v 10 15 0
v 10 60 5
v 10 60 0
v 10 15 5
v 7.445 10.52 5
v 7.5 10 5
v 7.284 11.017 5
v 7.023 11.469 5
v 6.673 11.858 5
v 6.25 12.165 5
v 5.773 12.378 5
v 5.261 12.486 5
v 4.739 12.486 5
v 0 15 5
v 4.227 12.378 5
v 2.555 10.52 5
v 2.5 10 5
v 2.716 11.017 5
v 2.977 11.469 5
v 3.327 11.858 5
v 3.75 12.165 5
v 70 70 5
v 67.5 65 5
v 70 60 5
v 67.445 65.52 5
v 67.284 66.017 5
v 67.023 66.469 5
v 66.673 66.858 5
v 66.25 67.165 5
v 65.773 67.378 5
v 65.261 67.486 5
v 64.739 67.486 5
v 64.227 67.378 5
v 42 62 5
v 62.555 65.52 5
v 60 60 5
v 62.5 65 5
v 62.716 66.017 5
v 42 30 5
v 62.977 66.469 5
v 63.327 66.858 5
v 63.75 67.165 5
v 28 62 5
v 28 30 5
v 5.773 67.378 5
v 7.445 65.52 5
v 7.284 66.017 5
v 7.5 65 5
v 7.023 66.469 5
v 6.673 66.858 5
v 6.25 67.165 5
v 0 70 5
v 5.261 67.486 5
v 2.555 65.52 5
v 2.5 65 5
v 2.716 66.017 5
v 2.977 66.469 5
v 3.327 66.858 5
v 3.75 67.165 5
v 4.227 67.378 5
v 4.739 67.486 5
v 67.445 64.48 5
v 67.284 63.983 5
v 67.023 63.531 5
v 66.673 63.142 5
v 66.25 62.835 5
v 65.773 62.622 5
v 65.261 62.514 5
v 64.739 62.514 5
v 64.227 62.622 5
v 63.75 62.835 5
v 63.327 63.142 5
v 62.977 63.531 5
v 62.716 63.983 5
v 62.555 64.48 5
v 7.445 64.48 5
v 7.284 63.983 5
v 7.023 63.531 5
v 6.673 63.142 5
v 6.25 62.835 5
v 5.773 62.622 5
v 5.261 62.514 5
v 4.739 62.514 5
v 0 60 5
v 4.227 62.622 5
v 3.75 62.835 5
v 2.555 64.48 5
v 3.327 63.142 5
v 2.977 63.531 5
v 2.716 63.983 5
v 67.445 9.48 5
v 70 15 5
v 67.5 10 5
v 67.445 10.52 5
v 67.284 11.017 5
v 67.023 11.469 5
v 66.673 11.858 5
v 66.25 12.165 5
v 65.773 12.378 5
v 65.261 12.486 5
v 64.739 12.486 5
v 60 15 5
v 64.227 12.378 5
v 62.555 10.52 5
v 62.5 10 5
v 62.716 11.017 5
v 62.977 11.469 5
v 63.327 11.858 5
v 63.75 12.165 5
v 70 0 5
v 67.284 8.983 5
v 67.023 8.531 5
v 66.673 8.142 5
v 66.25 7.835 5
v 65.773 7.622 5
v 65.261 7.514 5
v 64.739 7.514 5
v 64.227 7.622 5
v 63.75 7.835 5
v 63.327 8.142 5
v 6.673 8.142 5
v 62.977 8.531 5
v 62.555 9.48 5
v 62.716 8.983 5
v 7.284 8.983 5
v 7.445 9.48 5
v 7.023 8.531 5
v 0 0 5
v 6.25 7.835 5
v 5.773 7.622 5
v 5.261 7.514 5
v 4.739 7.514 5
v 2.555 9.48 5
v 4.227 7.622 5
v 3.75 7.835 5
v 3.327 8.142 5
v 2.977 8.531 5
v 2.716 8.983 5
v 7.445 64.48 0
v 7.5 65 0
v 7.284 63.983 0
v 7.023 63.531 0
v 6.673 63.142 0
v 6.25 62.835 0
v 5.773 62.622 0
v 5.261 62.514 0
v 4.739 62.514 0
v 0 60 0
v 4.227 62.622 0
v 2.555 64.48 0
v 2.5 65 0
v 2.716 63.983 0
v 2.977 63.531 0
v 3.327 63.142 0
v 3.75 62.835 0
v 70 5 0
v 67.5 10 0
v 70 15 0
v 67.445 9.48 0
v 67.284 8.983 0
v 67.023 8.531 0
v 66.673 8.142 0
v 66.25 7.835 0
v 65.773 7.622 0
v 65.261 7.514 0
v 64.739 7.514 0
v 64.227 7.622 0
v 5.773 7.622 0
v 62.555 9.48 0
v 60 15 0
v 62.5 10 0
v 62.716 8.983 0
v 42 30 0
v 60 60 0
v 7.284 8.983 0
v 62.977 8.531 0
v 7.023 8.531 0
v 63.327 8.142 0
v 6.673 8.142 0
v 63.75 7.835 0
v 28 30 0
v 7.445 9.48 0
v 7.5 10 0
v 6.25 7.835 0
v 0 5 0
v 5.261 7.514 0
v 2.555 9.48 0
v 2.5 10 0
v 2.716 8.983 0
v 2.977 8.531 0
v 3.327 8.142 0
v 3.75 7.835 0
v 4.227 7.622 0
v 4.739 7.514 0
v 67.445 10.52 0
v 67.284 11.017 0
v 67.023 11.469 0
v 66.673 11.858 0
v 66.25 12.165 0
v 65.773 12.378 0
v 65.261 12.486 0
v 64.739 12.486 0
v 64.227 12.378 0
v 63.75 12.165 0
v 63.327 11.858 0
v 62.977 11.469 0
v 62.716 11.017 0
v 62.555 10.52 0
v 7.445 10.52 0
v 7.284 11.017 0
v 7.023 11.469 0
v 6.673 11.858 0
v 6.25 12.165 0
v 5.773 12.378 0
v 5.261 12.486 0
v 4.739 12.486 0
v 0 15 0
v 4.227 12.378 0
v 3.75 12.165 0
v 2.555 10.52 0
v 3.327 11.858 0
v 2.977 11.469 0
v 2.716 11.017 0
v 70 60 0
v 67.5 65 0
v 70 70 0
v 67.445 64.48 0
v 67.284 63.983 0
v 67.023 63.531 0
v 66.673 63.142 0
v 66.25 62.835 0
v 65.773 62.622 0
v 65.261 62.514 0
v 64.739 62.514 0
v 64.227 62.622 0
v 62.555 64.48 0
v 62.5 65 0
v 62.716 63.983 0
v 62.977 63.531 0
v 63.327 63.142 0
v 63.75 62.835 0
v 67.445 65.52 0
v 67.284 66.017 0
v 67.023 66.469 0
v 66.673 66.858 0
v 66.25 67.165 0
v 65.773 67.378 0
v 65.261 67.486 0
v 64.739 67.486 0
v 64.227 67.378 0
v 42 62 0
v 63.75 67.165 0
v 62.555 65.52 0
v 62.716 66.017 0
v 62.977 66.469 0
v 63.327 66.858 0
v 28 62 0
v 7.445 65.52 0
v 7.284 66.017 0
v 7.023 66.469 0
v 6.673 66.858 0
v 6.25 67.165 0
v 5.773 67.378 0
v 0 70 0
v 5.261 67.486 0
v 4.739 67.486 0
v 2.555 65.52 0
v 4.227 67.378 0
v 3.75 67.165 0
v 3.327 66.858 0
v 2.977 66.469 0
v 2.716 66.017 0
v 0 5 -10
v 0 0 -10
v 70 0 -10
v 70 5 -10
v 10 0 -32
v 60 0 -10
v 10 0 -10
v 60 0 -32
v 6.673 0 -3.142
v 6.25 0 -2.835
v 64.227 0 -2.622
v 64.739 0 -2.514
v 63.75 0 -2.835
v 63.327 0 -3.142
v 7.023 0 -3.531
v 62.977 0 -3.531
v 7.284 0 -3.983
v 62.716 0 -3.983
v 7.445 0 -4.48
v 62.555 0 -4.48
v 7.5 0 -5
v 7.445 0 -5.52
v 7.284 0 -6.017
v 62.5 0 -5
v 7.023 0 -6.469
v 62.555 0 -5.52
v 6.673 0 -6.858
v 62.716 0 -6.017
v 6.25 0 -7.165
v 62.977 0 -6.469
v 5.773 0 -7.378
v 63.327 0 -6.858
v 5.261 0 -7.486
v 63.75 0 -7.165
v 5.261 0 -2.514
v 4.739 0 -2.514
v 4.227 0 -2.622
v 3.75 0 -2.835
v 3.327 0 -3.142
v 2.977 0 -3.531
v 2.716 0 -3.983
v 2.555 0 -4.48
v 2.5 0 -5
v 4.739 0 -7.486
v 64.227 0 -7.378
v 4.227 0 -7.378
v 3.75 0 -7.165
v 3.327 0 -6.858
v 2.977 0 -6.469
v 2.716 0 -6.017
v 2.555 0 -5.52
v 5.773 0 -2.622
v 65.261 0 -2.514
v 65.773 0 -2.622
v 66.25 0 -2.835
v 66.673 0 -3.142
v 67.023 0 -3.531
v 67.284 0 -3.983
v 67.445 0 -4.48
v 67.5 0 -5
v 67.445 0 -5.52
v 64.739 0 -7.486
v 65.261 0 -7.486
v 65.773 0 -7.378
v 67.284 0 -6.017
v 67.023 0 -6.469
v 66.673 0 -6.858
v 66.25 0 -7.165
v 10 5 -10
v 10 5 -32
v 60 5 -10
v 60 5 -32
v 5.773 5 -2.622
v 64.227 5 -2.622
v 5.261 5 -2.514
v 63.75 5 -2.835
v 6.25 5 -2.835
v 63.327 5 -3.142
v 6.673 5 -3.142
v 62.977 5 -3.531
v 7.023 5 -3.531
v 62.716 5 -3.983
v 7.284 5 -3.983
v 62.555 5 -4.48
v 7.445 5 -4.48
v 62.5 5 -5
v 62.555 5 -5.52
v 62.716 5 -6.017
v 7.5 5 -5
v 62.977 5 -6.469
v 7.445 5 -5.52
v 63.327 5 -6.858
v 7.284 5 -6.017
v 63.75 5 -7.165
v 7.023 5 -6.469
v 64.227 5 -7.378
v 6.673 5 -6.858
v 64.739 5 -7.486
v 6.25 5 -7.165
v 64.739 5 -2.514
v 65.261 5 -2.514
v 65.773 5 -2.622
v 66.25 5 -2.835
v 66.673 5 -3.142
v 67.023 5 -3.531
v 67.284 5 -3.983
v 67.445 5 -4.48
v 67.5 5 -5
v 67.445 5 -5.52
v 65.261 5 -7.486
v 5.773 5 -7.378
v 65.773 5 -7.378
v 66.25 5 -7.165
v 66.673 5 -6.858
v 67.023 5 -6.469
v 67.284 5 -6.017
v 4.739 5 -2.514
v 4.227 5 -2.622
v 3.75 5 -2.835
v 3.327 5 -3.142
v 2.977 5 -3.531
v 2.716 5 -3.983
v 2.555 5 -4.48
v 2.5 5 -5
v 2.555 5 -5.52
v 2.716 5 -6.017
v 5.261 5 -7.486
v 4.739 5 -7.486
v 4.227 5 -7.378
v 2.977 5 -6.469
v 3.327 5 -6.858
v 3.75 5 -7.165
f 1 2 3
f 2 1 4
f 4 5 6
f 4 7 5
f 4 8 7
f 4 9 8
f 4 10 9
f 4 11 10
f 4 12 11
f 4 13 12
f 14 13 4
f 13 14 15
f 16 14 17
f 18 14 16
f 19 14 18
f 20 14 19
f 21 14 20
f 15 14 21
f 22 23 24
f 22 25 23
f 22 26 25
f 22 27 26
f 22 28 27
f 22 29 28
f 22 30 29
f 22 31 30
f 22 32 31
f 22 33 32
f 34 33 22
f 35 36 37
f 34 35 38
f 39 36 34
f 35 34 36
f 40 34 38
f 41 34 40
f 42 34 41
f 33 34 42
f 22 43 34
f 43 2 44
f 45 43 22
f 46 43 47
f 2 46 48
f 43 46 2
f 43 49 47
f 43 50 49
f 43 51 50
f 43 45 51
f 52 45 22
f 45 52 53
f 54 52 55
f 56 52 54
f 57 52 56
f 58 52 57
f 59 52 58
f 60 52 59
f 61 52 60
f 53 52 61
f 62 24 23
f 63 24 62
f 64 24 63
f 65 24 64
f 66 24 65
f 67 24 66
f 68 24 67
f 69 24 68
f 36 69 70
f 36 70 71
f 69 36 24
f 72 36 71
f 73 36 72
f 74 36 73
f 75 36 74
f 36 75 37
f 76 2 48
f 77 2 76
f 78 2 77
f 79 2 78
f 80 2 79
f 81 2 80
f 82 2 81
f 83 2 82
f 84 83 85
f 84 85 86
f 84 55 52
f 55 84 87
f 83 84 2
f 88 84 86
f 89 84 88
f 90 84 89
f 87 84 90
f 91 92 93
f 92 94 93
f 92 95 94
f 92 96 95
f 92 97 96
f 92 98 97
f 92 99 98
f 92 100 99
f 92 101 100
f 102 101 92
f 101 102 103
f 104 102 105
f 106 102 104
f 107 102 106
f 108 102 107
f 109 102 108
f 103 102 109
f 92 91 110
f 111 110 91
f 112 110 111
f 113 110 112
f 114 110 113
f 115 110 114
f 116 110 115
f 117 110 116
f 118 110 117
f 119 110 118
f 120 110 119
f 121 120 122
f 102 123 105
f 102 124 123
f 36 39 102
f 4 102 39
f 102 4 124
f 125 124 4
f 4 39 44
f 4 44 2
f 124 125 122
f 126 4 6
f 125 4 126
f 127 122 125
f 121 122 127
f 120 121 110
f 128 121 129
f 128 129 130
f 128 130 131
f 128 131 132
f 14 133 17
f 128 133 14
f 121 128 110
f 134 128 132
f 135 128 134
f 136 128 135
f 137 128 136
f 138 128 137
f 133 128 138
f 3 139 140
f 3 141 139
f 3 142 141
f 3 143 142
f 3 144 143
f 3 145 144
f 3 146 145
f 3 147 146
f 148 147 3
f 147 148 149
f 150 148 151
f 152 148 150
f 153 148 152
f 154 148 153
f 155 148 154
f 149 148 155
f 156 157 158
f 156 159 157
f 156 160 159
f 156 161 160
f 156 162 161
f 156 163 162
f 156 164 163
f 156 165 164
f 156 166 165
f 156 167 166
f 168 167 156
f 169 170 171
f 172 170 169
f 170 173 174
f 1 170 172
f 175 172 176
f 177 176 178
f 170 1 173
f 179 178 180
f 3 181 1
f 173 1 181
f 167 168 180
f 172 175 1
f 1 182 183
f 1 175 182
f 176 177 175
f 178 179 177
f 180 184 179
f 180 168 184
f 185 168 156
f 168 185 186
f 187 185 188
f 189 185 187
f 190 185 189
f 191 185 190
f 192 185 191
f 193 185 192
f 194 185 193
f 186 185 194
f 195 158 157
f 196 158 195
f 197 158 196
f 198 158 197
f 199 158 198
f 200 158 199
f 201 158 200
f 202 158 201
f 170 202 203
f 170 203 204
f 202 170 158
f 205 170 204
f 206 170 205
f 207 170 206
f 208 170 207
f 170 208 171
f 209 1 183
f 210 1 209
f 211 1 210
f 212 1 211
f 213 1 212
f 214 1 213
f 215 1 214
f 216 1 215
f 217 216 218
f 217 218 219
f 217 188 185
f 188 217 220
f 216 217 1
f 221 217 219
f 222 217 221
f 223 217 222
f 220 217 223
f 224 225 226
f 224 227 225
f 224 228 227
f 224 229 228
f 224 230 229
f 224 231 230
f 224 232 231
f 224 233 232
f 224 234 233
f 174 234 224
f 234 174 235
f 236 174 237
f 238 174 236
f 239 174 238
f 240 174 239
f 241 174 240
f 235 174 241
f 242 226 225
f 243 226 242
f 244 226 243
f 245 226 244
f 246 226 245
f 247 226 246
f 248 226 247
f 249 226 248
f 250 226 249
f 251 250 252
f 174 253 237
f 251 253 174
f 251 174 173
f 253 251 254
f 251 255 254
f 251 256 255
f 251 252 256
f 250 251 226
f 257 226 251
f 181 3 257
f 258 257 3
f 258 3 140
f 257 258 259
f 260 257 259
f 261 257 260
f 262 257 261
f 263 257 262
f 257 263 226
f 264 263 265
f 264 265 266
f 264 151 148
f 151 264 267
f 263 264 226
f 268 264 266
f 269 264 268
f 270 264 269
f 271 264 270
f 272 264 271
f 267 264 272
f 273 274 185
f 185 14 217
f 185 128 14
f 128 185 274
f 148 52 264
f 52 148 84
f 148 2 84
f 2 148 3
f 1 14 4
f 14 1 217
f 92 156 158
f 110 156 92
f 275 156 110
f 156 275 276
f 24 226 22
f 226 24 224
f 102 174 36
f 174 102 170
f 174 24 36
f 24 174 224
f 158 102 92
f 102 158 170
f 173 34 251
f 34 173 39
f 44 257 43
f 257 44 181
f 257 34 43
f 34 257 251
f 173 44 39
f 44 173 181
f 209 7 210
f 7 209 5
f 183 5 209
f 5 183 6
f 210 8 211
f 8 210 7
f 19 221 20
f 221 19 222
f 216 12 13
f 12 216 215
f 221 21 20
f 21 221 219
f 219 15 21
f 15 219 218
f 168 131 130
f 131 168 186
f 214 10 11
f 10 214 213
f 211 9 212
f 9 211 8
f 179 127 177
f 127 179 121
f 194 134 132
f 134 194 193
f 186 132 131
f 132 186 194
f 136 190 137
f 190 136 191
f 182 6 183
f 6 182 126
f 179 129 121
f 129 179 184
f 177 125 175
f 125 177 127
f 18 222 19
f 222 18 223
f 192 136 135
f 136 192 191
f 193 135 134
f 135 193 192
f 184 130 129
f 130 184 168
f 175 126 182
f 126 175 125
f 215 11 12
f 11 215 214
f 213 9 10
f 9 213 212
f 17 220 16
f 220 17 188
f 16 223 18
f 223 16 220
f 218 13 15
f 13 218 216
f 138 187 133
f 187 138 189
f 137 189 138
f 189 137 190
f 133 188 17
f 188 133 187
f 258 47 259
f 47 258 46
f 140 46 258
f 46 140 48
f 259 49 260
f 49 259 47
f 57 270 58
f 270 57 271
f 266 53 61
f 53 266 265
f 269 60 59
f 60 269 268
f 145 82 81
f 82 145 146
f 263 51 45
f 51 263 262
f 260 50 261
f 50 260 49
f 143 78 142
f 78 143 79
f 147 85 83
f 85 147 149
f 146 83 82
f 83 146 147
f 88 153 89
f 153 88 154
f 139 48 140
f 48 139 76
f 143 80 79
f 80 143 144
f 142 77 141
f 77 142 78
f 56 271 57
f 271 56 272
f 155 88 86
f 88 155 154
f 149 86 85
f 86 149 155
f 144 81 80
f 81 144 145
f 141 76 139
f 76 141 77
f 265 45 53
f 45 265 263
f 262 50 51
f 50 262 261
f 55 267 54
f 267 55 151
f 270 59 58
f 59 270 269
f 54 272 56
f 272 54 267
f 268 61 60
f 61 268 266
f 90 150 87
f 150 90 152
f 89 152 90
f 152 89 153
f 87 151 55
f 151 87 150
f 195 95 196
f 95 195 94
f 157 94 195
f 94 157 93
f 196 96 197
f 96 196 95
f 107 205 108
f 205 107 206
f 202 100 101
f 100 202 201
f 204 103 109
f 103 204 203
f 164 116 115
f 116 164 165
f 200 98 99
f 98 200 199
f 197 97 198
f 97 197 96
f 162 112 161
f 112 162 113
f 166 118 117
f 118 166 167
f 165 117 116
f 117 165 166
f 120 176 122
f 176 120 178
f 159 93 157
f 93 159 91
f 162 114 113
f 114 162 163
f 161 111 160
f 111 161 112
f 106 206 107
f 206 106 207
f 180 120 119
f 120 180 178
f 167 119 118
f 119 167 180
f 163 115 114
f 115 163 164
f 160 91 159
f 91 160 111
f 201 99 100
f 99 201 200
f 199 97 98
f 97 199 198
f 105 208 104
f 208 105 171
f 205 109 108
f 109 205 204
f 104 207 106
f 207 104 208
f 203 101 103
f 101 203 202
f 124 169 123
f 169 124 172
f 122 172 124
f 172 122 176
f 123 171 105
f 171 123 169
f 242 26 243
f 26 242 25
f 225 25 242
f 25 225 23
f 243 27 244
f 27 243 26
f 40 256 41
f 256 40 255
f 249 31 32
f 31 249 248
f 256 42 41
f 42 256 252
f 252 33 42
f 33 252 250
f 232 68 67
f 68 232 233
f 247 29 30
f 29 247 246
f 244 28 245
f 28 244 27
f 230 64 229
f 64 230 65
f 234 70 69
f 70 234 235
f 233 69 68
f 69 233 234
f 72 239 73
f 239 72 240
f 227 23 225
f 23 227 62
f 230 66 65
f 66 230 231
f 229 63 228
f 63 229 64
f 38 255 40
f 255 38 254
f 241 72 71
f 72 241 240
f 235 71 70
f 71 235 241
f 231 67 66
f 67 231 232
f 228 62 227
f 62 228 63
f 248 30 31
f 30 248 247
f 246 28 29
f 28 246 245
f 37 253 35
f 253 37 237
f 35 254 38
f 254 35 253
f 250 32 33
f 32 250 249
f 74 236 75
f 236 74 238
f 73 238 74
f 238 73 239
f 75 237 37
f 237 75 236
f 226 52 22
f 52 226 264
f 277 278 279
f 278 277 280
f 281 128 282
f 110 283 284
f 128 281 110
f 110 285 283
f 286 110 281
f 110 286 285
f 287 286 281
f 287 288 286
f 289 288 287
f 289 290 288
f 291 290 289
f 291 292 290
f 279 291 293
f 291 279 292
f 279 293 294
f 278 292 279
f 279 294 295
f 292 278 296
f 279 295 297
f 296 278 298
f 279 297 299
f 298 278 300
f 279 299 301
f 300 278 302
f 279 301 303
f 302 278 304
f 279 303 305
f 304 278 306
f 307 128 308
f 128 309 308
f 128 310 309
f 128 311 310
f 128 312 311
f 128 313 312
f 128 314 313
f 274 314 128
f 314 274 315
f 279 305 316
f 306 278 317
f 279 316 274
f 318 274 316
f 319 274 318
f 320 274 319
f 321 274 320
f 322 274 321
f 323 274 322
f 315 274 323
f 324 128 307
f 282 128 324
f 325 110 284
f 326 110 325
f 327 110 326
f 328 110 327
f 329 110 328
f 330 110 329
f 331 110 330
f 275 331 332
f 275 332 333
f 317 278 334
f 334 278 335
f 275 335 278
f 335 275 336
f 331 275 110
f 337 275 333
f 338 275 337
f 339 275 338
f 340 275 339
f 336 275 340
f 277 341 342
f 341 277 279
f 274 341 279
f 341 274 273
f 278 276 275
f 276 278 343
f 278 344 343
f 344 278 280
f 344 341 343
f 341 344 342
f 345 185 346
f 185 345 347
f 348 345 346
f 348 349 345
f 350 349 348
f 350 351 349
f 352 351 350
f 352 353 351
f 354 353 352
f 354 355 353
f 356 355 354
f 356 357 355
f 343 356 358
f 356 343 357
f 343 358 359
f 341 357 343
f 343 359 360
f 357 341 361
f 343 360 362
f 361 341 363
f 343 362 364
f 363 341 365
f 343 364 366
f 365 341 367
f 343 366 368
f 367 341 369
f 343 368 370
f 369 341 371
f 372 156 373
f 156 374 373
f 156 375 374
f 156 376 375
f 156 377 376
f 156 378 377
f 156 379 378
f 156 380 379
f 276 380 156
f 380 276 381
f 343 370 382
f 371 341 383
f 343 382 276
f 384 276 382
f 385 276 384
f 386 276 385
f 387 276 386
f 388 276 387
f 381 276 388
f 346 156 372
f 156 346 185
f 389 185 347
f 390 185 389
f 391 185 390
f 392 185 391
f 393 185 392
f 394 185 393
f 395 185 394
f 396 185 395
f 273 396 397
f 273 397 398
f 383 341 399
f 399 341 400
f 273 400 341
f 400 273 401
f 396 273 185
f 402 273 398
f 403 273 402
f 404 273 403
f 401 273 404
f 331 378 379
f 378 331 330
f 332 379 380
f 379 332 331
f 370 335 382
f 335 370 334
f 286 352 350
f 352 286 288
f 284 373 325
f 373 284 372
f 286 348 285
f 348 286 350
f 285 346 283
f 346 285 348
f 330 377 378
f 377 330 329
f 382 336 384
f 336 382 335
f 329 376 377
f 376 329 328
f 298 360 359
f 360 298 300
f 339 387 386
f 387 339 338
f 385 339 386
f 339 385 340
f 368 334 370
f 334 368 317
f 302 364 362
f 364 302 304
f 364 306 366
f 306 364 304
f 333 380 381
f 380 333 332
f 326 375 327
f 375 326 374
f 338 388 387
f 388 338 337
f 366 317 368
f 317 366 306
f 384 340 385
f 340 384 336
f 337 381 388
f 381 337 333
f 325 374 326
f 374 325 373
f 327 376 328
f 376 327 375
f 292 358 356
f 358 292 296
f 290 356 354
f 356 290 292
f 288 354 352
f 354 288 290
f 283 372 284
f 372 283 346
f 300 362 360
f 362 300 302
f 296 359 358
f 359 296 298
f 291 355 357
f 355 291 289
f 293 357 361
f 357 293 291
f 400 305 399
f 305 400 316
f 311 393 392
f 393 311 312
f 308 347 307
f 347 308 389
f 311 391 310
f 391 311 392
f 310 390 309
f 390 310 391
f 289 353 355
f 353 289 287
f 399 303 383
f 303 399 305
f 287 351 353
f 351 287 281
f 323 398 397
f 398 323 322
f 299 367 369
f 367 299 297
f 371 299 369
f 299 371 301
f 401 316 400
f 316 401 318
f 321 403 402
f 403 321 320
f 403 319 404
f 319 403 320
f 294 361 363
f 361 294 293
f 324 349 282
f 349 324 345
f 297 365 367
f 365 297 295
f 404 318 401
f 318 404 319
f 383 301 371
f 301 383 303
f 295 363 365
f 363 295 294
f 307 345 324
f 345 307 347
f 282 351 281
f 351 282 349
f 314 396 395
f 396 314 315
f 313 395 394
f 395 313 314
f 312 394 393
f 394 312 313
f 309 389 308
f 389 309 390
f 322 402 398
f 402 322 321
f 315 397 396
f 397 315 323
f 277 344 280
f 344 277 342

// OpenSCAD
$fn = 30; // number of faces in screw holes

thickness = 5; // thickness

// main body
width = 70;
depth = 70;
height = 32;

// servo
sWidth = 14;
sDepth = 32;
sHeight = 5;

cWidth = 10; // cutout width

sDiameter = 5; // screw diameter

// top surface
difference()
{
    // main
    cube([width, depth, 5]);    
    
      union()
    {
        // edge cutout
        translate([0, 10+thickness, 0])
        cube([cWidth, 45, thickness]);
        
         // edge cutout
        translate([width-cWidth, 10+thickness, 0])
        cube([cWidth, 45, thickness]);
        
        // servo hole
        translate([(width/2)-(sWidth/2), 30, 0])
        cube([sWidth, sDepth, sHeight]);
        
        // screw holes
        
        // NOTE: it might be worth getting rid of the 
        // top lower holes, we dont need both them and 
        // the side faces holes
        
        // lower left
        translate([cWidth/2, cWidth/2+thickness, 0])
        cylinder(h=thickness, d=sDiameter);
        // upper left
        translate([cWidth/2, width-cWidth/2, 0])
        cylinder(h=thickness, d=sDiameter);
        // lower right
        translate([depth-cWidth/2, cWidth/2+thickness, 0])
        cylinder(h=thickness, d=sDiameter);
        // upper right
        translate([depth-cWidth/2, width-cWidth/2, 0])
        cylinder(h=thickness, d=sDiameter);
    }
}


// side surface
difference()
{
    // main
    translate([0, 0, -height])
    cube([width, thickness, height]);
    
    union()
    {
        // edge cutout
        translate([0, 0, -(height+5)])
        cube([cWidth, 10, 27]);
        
         // edge cutout
        translate([width-cWidth, 0, -(height+5)])
        cube([cWidth, 10, 27]);
        
        // lower right
        translate([depth-cWidth/2, cWidth/2, -5])
        rotate([90, 0, 0])
        cylinder(h=thickness, d=sDiameter);
        
        // lower left
        translate([cWidth/2, cWidth/2, -5])
        rotate([90, 0, 0])
        cylinder(h=thickness, d=sDiameter);
        
    }
    
}
